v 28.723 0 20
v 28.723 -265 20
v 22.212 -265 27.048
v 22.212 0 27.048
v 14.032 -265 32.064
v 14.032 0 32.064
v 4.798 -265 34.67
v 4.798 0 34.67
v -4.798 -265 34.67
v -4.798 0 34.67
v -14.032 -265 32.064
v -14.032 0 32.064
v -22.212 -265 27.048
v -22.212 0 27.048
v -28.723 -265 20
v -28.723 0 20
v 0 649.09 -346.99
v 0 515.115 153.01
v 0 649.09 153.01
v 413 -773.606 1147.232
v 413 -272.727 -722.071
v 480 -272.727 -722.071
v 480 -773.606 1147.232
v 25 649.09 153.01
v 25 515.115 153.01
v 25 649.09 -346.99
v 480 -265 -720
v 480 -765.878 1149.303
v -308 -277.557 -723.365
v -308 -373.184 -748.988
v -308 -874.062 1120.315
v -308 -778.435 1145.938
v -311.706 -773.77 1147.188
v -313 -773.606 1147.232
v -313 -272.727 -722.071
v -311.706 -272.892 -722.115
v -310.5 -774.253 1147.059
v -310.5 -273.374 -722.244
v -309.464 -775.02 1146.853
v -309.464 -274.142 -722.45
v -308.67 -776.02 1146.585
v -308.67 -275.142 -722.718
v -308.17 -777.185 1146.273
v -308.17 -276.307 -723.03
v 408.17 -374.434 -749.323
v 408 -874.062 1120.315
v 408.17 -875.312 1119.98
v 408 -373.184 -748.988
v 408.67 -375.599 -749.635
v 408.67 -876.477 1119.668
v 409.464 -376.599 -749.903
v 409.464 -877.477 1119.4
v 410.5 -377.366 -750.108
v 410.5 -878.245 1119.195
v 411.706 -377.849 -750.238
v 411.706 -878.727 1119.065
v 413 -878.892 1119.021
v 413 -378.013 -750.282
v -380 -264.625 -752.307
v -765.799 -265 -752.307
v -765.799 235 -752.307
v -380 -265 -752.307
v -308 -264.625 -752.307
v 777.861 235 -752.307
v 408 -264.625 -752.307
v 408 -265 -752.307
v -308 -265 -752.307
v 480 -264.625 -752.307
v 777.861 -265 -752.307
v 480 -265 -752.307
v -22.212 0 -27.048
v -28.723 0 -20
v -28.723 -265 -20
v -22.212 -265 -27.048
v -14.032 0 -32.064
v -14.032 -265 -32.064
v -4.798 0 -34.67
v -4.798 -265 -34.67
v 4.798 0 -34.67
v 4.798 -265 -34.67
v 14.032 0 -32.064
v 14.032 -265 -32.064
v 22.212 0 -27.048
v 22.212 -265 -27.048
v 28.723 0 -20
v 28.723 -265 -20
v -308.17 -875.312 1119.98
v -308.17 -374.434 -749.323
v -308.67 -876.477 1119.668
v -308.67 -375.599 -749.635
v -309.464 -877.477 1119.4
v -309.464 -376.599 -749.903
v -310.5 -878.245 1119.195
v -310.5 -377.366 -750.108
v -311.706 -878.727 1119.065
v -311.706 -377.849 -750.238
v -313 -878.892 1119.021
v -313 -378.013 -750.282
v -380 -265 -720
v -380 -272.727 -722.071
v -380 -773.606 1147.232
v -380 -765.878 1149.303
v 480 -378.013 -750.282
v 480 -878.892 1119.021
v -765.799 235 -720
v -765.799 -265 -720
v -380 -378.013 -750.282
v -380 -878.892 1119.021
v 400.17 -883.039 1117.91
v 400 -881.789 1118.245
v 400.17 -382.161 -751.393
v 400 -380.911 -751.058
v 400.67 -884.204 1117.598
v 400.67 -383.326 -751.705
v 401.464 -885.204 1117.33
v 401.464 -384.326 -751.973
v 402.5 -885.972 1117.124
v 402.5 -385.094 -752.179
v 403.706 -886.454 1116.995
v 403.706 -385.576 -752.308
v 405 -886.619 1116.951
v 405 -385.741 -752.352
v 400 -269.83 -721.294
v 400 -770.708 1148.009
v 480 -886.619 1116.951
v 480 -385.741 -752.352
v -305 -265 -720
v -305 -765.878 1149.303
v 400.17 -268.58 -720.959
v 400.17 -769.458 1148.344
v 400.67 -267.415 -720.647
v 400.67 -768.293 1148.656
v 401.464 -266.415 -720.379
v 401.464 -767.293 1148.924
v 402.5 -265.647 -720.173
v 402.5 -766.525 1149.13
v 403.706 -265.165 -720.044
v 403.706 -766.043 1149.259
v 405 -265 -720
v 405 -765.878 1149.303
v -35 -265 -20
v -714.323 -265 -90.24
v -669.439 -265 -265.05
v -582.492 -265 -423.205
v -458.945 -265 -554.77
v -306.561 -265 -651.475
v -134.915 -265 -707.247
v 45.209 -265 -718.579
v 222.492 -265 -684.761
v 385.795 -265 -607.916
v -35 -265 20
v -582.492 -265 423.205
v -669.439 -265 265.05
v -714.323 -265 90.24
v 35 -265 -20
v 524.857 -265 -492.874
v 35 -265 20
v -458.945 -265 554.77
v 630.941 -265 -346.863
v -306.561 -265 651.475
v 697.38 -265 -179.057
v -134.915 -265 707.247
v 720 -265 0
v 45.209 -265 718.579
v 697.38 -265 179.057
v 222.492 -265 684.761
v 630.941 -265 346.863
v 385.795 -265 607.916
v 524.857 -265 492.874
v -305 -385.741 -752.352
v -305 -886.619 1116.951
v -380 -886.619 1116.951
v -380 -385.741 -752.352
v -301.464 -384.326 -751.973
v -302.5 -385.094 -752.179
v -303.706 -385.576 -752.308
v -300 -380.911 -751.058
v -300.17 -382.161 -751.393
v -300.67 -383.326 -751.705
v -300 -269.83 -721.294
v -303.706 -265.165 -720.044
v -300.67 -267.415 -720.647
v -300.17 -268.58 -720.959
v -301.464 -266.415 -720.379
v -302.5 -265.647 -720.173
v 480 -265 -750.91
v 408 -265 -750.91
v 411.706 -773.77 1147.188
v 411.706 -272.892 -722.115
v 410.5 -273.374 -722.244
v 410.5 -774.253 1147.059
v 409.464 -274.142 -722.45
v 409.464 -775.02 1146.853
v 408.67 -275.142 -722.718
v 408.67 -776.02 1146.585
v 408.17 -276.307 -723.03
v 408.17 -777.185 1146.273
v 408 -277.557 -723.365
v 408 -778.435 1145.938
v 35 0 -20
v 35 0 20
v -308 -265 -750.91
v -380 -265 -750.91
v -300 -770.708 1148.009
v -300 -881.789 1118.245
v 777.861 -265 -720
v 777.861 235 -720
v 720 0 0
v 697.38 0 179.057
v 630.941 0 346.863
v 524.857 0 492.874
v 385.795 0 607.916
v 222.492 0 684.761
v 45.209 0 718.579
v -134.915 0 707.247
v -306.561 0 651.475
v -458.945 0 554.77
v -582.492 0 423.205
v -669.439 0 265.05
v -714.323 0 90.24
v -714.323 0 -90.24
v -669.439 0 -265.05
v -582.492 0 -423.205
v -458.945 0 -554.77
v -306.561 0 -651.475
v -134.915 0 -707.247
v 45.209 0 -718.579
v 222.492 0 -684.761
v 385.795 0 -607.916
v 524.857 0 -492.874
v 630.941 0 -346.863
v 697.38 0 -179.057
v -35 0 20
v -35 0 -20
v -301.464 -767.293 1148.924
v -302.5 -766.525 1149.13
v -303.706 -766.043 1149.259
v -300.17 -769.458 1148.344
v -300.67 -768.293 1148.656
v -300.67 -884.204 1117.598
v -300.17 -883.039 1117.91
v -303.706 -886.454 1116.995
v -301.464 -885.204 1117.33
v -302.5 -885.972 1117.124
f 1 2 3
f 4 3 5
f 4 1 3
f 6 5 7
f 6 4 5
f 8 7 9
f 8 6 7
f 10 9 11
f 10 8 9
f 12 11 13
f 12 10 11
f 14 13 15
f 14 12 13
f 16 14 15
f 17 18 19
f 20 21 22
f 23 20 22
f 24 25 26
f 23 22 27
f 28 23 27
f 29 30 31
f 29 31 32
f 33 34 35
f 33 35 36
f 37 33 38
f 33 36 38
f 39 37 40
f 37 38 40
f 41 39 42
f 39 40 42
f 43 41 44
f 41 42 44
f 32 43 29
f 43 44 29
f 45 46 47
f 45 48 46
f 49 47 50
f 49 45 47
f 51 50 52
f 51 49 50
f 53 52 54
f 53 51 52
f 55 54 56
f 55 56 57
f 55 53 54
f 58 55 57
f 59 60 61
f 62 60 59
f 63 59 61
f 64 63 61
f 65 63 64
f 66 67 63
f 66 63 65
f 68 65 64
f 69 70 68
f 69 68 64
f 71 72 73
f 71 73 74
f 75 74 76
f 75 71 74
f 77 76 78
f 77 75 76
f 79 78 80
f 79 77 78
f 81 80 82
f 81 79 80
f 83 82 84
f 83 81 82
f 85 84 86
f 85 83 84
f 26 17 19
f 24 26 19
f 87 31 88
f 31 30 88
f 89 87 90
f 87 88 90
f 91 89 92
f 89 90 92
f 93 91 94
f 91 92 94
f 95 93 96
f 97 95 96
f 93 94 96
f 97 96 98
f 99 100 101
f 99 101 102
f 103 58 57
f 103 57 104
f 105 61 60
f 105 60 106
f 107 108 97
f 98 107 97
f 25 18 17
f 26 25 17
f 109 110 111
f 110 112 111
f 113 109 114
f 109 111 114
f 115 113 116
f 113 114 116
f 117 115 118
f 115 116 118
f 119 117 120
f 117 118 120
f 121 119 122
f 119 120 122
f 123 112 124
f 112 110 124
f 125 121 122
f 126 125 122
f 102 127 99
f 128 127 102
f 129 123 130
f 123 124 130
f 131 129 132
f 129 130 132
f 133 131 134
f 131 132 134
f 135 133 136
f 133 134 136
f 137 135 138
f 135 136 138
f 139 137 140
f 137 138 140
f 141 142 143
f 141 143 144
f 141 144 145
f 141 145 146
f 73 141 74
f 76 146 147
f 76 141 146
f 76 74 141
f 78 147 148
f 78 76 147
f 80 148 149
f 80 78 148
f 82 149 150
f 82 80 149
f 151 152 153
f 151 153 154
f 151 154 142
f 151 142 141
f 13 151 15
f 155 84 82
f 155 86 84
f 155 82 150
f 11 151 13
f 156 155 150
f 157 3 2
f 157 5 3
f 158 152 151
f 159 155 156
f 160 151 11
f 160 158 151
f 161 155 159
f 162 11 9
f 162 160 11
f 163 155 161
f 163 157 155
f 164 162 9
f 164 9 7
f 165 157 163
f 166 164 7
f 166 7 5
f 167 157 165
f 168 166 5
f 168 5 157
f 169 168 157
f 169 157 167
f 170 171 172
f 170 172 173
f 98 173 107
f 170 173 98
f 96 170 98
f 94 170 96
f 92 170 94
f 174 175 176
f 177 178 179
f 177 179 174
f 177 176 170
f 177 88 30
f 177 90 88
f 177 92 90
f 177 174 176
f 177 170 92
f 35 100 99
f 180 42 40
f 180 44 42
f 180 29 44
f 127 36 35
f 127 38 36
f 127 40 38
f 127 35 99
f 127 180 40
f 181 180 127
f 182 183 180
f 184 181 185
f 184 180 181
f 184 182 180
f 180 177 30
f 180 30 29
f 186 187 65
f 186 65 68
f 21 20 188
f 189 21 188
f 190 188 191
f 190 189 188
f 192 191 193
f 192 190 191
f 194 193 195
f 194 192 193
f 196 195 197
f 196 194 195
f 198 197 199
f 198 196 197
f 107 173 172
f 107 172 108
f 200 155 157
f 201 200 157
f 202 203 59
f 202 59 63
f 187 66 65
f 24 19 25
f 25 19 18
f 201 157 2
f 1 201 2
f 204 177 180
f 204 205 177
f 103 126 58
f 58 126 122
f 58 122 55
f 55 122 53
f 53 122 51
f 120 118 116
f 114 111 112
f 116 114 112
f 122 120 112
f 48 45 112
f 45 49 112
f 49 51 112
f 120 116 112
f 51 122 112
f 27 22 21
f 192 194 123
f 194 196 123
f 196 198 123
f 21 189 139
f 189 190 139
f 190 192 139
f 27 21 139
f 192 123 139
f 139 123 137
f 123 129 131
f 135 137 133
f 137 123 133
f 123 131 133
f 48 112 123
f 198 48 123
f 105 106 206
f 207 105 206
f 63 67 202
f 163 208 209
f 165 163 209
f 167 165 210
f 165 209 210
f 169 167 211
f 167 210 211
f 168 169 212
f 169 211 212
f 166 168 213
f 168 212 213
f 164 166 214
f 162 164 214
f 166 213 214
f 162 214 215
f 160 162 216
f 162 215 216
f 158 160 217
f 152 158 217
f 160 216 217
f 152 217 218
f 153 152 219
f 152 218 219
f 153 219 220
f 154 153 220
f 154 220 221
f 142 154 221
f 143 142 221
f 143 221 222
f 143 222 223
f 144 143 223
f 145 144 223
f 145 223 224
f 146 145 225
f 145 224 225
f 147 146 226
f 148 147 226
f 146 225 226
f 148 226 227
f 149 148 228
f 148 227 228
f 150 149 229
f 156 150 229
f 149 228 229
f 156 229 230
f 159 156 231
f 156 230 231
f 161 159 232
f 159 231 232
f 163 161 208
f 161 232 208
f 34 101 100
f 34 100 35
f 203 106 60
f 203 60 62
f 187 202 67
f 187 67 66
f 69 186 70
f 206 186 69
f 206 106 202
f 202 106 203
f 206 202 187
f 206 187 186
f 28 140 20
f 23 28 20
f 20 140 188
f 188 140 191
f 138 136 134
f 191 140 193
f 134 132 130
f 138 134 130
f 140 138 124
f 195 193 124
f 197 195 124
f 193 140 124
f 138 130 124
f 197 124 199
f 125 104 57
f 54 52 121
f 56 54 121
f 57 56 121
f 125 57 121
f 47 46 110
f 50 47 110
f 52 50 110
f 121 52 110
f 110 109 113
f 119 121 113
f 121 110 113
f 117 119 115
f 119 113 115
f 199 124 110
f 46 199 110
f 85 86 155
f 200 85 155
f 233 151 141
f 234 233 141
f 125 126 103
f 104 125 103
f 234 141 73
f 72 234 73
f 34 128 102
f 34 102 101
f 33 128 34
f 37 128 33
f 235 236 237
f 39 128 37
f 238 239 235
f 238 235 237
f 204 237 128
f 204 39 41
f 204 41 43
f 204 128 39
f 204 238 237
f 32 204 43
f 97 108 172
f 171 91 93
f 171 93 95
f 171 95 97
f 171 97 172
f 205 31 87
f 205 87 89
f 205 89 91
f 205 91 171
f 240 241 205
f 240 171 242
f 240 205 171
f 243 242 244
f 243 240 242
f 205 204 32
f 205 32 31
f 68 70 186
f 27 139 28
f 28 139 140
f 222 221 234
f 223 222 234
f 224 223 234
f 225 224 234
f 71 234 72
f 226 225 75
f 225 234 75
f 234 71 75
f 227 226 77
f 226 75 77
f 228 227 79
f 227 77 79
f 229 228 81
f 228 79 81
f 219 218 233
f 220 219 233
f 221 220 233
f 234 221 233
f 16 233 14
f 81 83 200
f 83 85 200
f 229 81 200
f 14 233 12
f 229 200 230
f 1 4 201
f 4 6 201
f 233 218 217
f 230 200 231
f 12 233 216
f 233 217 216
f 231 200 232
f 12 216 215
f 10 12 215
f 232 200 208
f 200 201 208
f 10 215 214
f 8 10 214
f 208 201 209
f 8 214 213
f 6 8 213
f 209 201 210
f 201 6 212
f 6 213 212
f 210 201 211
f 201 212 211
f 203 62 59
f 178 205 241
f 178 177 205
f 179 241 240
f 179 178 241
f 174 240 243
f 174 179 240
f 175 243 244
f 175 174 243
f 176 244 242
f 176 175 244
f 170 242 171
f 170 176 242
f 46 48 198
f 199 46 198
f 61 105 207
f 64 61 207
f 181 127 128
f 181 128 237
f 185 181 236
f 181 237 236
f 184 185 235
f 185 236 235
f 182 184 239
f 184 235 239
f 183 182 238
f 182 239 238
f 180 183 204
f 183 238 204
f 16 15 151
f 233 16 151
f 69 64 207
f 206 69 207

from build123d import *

# Parameters (mm, degrees)
F0_R      = 720
F0_R_2    = 35
F1_DEPTH  = 265
F3_DEPTH  = 265.001
F4_W      = 1543.660223484
F4_H      = 32.3074746132
F5_DEPTH  = 500
F7_START  = -300
F7_DEPTH  = 80
F8_START  = 400
F8_DEPTH  = 80
F9_W      = 72
F9_H      = 109
F10_DEPTH = 2095.9054427361
F11_R     = 5
F11_2_R   = 5
F12_R     = 5
F13_R     = 5
F14_R     = 5
F15_R     = 5
F17_DEPTH = 25


# Not quite as in the source:
# - a feature names something its author has since deleted; it is built from what else it names


with BuildPart() as f1:
    # F0 (on Front) → F1 (new body)
    with BuildSketch(Plane.XZ):
        Circle(F0_R)
        Circle(F0_R_2, mode=Mode.SUBTRACT)
    extrude(amount=F1_DEPTH)

    # F2 (on face) → F3 (cut, through all)
    with BuildSketch(Plane.XZ.offset(265)):
        with BuildLine():
            ThreePointArc((28.7228132327, 20), (33.3938502059, 10.4809717311), (35, 0))
            Line((35, 0), (35, 20))
            Line((35, 20), (28.7228132327, 20))
        make_face()
        with BuildLine():
            Line((35, -20), (35, 0))
            ThreePointArc((35, 0), (33.3938502059, -10.4809717311), (28.7228132327, -20))
            Line((28.7228132327, -20), (35, -20))
        make_face()
        with BuildLine():
            ThreePointArc((-28.7228132327, -20), (-33.3938502035, -10.4809717386), (-35, -1.57e-08))
            Line((-35, -1.57e-08), (-35, -20))
            Line((-35, -20), (-28.7228132327, -20))
        make_face()
        with BuildLine():
            Line((-35, 20), (-35, -1.57e-08))
            ThreePointArc((-35, -1.57e-08), (-33.3938502082, 10.4809717236), (-28.7228132327, 20))
            Line((-28.7228132327, 20), (-35, 20))
        make_face()
    extrude(amount=-F3_DEPTH, mode=Mode.SUBTRACT)


with BuildPart() as f5:
    # F4 (on face) → F5 (new body)
    with BuildSketch(Plane.XZ.offset(265)):
        with Locations((6.0311257839, -736.1537373066)):
            Rectangle(F4_W, F4_H)
    extrude(amount=-F5_DEPTH)


with BuildPart() as f7:
    # F6 (on Right) → F7 (new body)
    with BuildSketch(Plane.YZ.offset(F7_START)):
        Polygon((-385.7407282861, -752.3523806378), (-265, -720), (-765.8782422817, 1149.3030486012), (-886.6189705679, 1116.9506679634), align=None)
    extrude(amount=-F7_DEPTH)


with BuildPart() as f8:
    # F6 (on Right) → F8 (new body)
    with BuildSketch(Plane.YZ.offset(F8_START)):
        Polygon((-385.7407282861, -752.3523806378), (-265, -720), (-765.8782422817, 1149.3030486012), (-886.6189705679, 1116.9506679634), align=None)
    extrude(amount=F8_DEPTH)


with BuildPart() as f10_tool:
    # F9 (on face) → F10 (new body, through all)
    with BuildSketch(Plane(origin=(0, -338.6298762803, 1263.7839032388), x_dir=(1, 0, 0), z_dir=(0, -0.2588190451, 0.9659258263))):
        with Locations((444, -504.8200564404)):
            Rectangle(F9_W, F9_H)
        with Locations((-344, -504.8200564404)):
            Rectangle(F9_W, F9_H)
    extrude(amount=-F10_DEPTH)


with BuildPart() as f5_1:
    add(f5.part)

    # F10: cut by f10_tool
    add(f10_tool.part, mode=Mode.SUBTRACT)


with BuildPart() as f7_1:
    add(f7.part)

    # F10: cut by f10_tool
    add(f10_tool.part, mode=Mode.SUBTRACT)

    # F11
    f11_edges = [f7_1.edges().sort_by_distance(p)[0] for p in [
        (-308, -523.166528, 212.580972),
    ]]
    fillet(f11_edges, radius=F11_R)

    # F12
    f12_edges = [f7_1.edges().sort_by_distance(p)[0] for p in [
        (-300, -636.179849, 182.299144),
        (-300, -515.439121, 214.651524),
    ]]
    fillet(f12_edges, radius=F12_R)

    # F13
    f13_edges = [f7_1.edges().sort_by_distance(p)[0] for p in [
        (-308, -628.452443, 184.369696),
    ]]
    fillet(f13_edges, radius=F13_R)


with BuildPart() as f8_1:
    add(f8.part)

    # F10: cut by f10_tool
    add(f10_tool.part, mode=Mode.SUBTRACT)

    # F11#2
    f11_2_edges = [f8_1.edges().sort_by_distance(p)[0] for p in [
        (400, -515.439121, 214.651524),
        (400, -636.179849, 182.299144),
    ]]
    fillet(f11_2_edges, radius=F11_2_R)

    # F14
    f14_edges = [f8_1.edges().sort_by_distance(p)[0] for p in [
        (408, -523.166528, 212.580972),
    ]]
    fillet(f14_edges, radius=F14_R)

    # F15
    f15_edges = [f8_1.edges().sort_by_distance(p)[0] for p in [
        (408, -628.452443, 184.369696),
    ]]
    fillet(f15_edges, radius=F15_R)


with BuildPart() as f17:
    # F16 (on Right) → F17 (new body)
    with BuildSketch(Plane.YZ):
        Polygon((515.1153491874, 153.0095694043), (649.089945403, -346.9904305957), (649.089945403, 153.0095694043), align=None)
    extrude(amount=F17_DEPTH)


solid = Compound([f1.part, f5_1.part, f7_1.part, f8_1.part, f17.part])
